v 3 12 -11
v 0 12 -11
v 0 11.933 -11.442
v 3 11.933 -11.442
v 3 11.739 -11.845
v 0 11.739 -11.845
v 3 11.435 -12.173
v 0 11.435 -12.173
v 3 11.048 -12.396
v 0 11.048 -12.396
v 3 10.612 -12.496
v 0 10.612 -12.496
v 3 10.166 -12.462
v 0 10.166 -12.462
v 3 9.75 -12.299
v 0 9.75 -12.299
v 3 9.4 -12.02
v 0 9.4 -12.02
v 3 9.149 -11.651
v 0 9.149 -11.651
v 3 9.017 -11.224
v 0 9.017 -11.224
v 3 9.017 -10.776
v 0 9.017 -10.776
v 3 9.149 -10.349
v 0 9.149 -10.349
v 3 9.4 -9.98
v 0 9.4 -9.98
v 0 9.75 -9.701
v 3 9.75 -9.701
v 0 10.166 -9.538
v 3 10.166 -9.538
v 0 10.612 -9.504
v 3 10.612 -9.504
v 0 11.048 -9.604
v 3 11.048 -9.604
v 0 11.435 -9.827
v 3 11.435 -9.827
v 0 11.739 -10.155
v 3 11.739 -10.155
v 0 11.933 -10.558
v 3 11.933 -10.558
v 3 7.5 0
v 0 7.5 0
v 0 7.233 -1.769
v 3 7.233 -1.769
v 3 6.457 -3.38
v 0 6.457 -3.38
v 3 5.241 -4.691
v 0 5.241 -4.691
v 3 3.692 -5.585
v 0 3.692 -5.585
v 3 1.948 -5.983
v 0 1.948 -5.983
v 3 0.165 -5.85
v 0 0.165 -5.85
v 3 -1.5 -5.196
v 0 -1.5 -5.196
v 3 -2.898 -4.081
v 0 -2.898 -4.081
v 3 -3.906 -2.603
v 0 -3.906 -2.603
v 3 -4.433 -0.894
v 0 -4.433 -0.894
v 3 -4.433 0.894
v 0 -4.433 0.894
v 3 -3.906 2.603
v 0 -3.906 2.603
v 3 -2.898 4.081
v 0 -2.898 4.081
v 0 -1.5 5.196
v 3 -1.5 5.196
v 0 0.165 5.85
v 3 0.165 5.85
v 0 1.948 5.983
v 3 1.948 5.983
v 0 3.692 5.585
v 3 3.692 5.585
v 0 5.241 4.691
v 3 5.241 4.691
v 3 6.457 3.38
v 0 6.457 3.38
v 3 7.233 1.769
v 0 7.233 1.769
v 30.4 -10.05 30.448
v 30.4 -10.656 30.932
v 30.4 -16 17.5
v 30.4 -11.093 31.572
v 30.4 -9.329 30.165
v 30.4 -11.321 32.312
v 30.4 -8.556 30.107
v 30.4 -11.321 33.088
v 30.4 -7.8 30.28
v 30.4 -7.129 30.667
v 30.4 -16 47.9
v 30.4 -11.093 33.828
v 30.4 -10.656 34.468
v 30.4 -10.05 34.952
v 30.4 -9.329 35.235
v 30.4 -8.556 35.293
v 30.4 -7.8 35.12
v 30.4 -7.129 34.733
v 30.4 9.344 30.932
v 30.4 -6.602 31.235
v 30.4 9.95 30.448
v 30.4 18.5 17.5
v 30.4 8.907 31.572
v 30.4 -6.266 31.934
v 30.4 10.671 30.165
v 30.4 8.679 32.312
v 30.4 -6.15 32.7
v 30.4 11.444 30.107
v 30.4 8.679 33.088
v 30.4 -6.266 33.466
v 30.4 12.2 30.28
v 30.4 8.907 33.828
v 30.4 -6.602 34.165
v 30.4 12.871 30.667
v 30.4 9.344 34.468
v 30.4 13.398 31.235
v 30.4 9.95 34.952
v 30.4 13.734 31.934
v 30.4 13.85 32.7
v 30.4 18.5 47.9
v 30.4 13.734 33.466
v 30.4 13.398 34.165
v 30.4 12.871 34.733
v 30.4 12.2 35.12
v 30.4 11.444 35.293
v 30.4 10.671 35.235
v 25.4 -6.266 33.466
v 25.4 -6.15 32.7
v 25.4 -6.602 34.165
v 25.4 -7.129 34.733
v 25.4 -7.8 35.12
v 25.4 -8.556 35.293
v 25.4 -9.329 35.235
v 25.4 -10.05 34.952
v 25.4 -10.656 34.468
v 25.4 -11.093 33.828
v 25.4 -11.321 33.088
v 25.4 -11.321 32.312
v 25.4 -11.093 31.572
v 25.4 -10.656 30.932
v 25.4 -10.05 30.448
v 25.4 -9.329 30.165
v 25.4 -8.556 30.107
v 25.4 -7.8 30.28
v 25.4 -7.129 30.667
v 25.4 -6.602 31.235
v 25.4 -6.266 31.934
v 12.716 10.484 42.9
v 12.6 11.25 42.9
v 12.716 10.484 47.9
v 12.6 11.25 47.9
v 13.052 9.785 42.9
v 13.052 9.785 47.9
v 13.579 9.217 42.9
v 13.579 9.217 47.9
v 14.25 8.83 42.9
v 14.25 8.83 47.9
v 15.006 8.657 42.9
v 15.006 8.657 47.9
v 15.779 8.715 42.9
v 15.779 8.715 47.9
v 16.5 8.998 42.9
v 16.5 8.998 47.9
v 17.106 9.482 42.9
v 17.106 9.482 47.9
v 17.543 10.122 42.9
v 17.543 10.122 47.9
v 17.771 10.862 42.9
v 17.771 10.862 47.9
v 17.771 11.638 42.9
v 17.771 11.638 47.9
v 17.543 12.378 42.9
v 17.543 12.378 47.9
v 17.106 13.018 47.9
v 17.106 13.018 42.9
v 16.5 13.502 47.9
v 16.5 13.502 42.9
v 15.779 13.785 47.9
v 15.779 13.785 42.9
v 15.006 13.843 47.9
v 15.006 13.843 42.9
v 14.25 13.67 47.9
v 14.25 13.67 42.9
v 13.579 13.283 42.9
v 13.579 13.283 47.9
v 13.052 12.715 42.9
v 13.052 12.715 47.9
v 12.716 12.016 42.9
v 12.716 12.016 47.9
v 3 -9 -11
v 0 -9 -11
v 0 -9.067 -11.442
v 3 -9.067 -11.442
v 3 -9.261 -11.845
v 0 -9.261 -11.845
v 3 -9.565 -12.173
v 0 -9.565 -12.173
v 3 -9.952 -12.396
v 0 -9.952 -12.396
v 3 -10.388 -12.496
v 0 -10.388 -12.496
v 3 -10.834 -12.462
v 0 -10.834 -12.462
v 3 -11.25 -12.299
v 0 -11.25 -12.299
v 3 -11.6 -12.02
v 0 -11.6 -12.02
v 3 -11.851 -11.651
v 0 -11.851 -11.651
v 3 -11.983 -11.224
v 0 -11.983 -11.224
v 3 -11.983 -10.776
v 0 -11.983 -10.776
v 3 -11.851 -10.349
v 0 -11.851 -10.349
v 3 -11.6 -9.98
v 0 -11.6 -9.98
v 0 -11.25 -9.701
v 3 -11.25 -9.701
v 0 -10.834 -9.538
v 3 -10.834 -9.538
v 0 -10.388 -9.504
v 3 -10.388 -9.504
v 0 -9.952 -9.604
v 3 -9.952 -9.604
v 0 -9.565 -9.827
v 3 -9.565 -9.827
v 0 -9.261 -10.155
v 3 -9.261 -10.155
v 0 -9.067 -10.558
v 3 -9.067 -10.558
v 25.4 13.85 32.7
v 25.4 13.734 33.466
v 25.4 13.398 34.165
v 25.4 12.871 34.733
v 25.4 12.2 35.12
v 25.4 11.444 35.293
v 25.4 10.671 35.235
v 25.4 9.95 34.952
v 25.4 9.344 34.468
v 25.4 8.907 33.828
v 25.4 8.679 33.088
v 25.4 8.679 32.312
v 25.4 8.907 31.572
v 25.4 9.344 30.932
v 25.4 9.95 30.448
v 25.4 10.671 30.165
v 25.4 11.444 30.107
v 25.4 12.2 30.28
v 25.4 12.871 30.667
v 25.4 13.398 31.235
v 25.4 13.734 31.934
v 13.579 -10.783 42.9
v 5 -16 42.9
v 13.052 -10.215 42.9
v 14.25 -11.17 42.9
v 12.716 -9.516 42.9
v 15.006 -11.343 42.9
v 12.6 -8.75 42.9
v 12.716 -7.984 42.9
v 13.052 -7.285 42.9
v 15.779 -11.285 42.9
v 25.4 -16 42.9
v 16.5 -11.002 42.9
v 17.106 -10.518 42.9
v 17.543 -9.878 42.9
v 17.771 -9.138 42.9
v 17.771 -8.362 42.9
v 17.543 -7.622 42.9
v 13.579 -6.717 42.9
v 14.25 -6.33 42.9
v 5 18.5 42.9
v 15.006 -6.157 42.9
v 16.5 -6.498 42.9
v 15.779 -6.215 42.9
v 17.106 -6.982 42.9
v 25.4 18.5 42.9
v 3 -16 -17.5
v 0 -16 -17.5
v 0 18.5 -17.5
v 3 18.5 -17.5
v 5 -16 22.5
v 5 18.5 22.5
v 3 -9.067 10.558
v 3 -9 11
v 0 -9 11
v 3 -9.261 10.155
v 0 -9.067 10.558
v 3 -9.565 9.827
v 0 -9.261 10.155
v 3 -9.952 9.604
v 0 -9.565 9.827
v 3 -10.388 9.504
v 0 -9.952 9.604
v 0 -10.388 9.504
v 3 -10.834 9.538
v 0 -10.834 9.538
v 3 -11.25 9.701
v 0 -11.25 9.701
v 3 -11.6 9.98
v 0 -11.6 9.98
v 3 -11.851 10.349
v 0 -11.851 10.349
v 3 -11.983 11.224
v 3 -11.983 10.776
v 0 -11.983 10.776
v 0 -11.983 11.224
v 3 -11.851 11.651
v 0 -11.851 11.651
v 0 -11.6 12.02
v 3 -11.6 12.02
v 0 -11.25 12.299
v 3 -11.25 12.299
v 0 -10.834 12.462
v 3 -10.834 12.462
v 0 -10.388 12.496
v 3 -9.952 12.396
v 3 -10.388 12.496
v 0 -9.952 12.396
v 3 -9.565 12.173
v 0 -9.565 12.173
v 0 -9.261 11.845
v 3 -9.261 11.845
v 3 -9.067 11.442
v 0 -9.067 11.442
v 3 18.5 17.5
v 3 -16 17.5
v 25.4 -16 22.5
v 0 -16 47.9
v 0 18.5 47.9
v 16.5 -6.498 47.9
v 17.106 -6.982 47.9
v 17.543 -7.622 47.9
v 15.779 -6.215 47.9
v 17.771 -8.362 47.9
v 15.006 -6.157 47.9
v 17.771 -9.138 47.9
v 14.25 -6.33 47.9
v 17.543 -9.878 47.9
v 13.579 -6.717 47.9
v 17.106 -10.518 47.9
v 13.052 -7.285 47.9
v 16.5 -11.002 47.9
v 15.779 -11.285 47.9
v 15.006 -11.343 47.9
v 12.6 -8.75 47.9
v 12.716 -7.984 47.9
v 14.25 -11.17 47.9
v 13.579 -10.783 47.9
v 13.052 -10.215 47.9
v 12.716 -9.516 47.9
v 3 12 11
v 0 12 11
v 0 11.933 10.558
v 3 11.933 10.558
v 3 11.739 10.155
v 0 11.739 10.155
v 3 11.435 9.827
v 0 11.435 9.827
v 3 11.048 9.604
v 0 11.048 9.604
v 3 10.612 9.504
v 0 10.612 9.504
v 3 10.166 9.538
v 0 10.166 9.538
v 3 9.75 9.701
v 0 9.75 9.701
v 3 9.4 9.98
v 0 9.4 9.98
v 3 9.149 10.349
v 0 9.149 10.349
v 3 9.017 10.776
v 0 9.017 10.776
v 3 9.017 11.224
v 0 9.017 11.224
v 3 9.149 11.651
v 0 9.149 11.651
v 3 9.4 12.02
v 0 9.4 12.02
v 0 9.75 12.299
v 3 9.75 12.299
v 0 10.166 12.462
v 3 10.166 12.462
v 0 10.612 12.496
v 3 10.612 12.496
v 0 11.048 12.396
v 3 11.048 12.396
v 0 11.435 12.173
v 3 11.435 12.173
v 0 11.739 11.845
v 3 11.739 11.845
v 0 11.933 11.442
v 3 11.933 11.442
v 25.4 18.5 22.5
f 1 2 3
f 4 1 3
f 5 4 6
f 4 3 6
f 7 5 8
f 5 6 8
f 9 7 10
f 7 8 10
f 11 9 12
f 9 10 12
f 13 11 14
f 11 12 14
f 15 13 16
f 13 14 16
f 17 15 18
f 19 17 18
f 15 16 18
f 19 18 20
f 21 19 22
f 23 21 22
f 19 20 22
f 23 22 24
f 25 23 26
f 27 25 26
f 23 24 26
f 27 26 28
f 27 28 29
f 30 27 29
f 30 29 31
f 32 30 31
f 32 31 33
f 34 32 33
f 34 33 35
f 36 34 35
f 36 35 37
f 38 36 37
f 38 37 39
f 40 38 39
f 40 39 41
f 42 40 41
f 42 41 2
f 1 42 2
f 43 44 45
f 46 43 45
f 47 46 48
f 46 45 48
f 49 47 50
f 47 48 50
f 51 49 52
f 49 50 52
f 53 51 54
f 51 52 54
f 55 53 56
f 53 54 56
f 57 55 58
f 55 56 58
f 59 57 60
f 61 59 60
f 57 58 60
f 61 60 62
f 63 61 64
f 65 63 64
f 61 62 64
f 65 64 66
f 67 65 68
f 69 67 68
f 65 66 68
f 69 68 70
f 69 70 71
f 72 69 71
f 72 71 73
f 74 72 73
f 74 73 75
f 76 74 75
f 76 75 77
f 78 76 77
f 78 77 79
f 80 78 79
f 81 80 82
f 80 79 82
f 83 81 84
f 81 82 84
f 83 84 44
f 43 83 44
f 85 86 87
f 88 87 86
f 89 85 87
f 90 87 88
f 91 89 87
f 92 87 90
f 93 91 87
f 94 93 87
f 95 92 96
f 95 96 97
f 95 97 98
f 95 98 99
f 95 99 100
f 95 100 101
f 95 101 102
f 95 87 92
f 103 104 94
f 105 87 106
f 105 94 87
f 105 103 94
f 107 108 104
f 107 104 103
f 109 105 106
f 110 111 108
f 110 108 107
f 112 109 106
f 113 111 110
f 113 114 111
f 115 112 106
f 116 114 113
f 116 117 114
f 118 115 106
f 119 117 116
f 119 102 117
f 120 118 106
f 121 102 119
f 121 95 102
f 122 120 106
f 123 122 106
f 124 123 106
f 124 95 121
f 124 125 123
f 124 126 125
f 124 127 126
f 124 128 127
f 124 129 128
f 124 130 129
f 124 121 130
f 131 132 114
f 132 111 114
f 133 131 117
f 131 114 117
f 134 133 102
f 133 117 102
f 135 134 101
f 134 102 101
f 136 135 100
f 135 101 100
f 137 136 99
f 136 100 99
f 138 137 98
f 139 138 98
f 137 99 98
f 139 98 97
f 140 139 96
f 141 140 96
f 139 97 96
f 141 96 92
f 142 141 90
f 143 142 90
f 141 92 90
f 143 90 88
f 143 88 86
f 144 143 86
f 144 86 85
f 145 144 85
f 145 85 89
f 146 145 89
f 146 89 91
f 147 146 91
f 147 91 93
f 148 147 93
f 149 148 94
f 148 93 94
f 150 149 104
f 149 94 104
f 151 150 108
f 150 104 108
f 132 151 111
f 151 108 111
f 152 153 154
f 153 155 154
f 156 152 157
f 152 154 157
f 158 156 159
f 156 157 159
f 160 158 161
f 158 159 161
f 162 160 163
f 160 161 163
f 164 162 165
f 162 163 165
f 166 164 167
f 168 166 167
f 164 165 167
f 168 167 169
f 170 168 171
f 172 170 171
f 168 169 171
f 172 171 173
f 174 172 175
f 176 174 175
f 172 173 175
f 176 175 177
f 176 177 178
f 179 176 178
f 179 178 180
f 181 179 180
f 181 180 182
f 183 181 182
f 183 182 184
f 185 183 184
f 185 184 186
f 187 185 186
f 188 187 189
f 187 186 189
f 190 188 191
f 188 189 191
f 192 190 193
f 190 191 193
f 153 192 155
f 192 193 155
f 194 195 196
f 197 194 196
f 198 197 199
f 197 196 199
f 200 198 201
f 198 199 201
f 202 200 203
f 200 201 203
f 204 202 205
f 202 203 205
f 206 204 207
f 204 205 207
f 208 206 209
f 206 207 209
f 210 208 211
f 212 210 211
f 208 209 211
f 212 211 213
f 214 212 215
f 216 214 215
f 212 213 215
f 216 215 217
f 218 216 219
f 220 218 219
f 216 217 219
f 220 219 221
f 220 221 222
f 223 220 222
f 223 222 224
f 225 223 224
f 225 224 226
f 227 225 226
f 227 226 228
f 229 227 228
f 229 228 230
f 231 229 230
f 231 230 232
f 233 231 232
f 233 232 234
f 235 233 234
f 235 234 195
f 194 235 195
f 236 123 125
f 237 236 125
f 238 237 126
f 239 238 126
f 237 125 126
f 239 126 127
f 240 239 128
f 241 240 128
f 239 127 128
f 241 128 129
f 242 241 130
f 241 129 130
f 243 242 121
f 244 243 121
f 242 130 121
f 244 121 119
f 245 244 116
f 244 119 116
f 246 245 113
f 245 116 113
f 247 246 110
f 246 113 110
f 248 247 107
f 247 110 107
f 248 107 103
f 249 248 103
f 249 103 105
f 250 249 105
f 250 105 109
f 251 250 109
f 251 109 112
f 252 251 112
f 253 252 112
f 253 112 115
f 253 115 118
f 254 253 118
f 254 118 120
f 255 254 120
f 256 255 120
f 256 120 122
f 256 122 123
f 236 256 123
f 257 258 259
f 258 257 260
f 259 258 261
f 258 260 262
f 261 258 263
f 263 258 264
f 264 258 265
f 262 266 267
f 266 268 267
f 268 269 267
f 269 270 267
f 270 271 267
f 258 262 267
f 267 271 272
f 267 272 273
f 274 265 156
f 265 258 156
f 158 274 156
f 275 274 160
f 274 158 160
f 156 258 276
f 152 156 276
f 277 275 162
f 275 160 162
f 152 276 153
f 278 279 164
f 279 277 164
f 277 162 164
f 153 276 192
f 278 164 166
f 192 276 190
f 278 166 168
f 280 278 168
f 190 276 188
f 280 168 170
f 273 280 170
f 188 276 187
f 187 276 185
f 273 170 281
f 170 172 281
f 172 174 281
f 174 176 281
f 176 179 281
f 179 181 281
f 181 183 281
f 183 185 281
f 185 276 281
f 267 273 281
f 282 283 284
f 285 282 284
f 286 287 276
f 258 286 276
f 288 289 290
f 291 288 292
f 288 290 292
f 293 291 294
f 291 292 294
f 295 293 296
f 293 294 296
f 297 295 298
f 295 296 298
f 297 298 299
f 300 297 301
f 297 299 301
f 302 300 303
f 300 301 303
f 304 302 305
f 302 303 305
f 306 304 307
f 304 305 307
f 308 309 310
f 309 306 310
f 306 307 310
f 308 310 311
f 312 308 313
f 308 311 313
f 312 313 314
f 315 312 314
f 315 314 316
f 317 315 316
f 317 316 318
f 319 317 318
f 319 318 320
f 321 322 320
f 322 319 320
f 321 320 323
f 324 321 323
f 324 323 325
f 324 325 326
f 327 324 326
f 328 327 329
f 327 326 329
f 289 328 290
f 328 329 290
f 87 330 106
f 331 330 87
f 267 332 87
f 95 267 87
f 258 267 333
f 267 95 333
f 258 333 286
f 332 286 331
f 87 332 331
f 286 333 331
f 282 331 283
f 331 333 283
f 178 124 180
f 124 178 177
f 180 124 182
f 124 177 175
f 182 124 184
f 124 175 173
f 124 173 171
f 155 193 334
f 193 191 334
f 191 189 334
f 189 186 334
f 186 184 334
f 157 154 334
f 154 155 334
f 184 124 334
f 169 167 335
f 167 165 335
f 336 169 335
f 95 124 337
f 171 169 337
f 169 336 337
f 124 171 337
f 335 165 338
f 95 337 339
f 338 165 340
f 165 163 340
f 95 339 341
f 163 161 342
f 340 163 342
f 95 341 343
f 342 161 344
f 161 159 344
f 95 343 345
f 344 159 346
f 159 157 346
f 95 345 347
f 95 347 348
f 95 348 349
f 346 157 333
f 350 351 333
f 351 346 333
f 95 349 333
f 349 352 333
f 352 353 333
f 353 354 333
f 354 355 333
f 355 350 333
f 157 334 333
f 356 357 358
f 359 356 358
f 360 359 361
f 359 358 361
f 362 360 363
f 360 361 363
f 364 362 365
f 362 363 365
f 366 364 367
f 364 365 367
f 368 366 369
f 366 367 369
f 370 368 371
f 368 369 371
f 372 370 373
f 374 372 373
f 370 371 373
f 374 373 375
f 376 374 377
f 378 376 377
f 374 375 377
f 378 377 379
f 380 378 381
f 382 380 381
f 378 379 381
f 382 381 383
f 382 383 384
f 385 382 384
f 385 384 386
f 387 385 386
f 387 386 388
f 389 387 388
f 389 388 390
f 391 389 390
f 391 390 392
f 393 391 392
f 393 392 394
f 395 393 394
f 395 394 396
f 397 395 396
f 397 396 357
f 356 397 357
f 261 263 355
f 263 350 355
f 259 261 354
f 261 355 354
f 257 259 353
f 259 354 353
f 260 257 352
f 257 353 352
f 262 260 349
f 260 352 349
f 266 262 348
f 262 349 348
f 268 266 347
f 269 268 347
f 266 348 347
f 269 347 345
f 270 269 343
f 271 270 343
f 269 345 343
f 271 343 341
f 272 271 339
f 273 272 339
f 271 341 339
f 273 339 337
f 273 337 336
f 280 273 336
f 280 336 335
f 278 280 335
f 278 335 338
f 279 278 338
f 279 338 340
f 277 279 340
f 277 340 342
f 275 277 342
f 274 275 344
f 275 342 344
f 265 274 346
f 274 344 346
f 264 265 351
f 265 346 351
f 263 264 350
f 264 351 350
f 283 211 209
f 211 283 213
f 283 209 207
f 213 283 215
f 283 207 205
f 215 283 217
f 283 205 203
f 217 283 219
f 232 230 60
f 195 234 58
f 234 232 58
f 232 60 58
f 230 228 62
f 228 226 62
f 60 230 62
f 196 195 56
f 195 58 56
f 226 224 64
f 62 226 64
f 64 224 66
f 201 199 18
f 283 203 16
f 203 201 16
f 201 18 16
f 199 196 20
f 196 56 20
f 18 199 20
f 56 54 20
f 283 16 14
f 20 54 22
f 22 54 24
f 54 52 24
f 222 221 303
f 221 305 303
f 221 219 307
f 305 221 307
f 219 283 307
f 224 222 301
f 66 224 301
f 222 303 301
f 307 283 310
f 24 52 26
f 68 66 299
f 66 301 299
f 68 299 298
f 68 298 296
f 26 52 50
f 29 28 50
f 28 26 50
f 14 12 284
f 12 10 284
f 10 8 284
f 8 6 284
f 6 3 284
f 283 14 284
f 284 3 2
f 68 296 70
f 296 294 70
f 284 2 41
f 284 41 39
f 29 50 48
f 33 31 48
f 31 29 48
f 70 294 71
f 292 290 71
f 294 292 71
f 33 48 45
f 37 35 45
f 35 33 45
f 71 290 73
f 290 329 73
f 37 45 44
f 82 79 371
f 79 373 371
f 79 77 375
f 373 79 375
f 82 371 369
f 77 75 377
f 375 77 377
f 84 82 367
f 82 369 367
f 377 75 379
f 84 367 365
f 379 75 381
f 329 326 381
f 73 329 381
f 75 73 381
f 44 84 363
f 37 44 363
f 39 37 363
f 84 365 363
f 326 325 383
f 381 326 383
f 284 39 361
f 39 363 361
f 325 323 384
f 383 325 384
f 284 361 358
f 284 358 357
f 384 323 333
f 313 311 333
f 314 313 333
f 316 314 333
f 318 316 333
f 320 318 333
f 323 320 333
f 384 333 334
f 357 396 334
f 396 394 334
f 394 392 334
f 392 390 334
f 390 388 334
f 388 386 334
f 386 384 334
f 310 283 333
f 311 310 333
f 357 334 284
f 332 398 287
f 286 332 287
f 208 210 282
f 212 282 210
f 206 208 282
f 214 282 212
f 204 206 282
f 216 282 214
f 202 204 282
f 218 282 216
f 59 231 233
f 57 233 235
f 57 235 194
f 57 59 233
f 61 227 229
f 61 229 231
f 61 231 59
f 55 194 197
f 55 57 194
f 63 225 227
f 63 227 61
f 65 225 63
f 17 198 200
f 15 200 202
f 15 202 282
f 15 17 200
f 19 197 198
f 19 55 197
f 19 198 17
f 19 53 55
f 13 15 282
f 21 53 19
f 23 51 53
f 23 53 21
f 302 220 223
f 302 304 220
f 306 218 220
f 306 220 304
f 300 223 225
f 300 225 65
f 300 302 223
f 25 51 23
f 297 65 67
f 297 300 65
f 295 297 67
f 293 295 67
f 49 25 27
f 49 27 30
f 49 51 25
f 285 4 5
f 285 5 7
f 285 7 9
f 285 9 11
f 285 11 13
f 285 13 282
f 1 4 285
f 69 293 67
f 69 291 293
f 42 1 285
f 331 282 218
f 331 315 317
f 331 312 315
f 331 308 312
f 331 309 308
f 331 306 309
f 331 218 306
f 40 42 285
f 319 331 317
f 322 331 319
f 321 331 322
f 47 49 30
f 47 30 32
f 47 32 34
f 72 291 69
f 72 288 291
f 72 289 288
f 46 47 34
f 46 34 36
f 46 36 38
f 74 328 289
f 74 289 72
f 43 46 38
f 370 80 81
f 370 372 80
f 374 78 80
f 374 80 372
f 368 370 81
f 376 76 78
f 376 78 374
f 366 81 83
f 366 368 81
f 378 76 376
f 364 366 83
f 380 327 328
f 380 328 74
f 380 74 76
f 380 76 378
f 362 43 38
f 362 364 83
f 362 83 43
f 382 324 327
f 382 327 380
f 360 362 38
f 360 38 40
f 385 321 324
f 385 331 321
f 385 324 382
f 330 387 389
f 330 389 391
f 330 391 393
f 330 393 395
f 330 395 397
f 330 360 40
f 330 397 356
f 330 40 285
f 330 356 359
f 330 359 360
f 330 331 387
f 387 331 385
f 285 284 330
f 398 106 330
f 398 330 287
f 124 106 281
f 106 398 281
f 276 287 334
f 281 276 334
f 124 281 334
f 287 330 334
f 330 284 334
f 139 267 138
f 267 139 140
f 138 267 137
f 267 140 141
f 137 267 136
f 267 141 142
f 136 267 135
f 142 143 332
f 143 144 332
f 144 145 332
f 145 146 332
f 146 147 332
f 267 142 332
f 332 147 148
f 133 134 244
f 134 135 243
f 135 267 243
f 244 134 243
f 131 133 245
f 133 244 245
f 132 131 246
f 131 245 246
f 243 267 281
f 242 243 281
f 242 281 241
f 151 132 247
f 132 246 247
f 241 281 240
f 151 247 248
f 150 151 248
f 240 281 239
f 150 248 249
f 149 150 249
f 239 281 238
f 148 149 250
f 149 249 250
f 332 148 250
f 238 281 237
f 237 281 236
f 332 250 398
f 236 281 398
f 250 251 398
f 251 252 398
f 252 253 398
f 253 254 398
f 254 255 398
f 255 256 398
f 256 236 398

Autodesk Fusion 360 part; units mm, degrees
sketch "스케치1" plane through (0, 0, 0) normal (1, 0, 0) x (0, 1, 0)
  line L0 (10.5, 11) -> (-10.5, 11)
  line L1 (-10.5, 11) -> (-10.5, -11)
  line L2 (-10.5, -11) -> (10.5, -11)
  line L3 (10.5, -11) -> (10.5, 11)
  line L4 (10.5, 11) -> (-10.5, -11) construction
  line L5 (-10.5, 11) -> (10.5, -11) construction
  circle A0 centre (10.5, 11) radius 1.5
  circle A1 centre (-10.5, 11) radius 1.5
  circle A2 centre (10.5, -11) radius 1.5
  circle A3 centre (-10.5, -11) radius 1.5
  line L6 (10.5, 0) -> (1.5, 0)
  circle A4 centre (1.5, 0) radius 6
  line L7 (10.5, 0) -> (18.5, 0)
  line L8 (1.5, 0) -> (-16, 0)
  line L9 (18.5, 0) -> (18.5, 17.5)
  line L10 (-16, 0) -> (-16, -17.5)
  line L11 (-16, -17.5) -> (18.5, -17.5)
  line L12 (18.5, -17.5) -> (18.5, 17.5)
  line L13 (18.5, 17.5) -> (-16, 17.5)
  line L14 (-16, 17.5) -> (-16, -17.5)
  line L15 (-16, 17.5) -> (18.5, 17.5)
  line L16 (18.5, 17.5) -> (18.5, 47.9)
  line L17 (18.5, 47.9) -> (-16, 47.9)
  line L18 (-16, 47.9) -> (-16, 17.5)
  dimension "d1" = 21
  dimension "d2" = 22
  dimension "d3" = 3
  dimension "d4" = 3
  dimension "d5" = 3
  dimension "d6" = 3
  dimension "d8" = 9
  dimension "d9" = 12
  dimension "d10" = 8
  dimension "d11" = 17.5
  dimension "d12" = 17.5
  dimension "d13" = 17.5
  dimension "d16" = 30.4
extrude "돌출1" add sketch "스케치1" along normal blind 3 contours L0 L1 L3 A0 A1 L7 L8 L9 L12 L13 L14 L15 | L0 L1 L3 A0 A1 L6 A4 L8 | L1 L2 L3 A2 A3 L6 A4 L8 | L1 L2 L3 A2 A3 L7 L8 L10 L11 L12 L14 | L13 L15 L16 L17 L18
extrude "돌출2" add sketch "스케치1" along normal blind 30.4 contours L13 L15 L16 L17 L18
sketch "스케치5" plane through (0, 18.5, 0) normal (0, 1, 0) x (-1, 0, 0)
  line L0 (-3, 17.5) -> (-3, -17.5)
  line L1 (-3, -17.5) -> (0, -17.5)
  line L2 (0, -17.5) -> (0, 47.9)
  line L3 (0, 47.9) -> (-30.4, 47.9)
  line L4 (-30.4, 47.9) -> (-30.4, 17.5)
  line L5 (-30.4, 17.5) -> (-3, 17.5)
  line L6 (-30.4, 47.9) -> (0, 47.9)
  line L7 (0, 47.9) -> (0, 17.5)
  line L8 (0, 17.5) -> (-30.4, 17.5)
  line L9 (-30.4, 17.5) -> (-30.4, 47.9)
  line L10 (-5, 42.9) -> (-25.4, 42.9)
  line L11 (-25.4, 42.9) -> (-25.4, 22.5)
  line L12 (-25.4, 22.5) -> (-5, 22.5)
  line L13 (-5, 22.5) -> (-5, 42.9)
  line L14 (-5, 42.9) -> (-25.4, 22.5) construction
  line L15 (-25.4, 42.9) -> (-5, 22.5) construction
  point P0 (-15.2, 32.7)
  dimension "d37" = 20.4
  dimension "d38" = 20.4
extrude "돌출7" cut sketch "스케치5" against normal blind 100 contours L10 L11 L12 L13
sketch "스케치6" plane through (0, 0, 47.9) normal (0, 0, 1) x (-1, 0, 0)
  line L0 (0, -18.5) -> (0, 16)
  line L1 (0, 16) -> (-30.4, 16)
  line L2 (-30.4, 16) -> (-30.4, -18.5)
  line L3 (-30.4, -18.5) -> (0, -18.5)
  line L4 (-15.2, 16) -> (-15.2, 8.75)
  circle A0 centre (-15.2, 8.75) radius 2.6
  line L5 (-15.2, -18.5) -> (-15.2, -11.25)
  circle A1 centre (-15.2, -11.25) radius 2.6
  dimension "d41" = 7.25
  dimension "d42" = 5.2
  dimension "d43" = 7.25
  dimension "d44" = 5.2
extrude "돌출8" cut sketch "스케치6" against normal blind 5 contours A0 | A1
sketch "스케치7" plane through (30.4, 0, 0) normal (1, 0, 0) x (0, 1, 0)
  line L0 (-16, 47.9) -> (-16, 17.5)
  line L1 (-16, 17.5) -> (18.5, 17.5)
  line L2 (18.5, 17.5) -> (18.5, 47.9)
  line L3 (18.5, 47.9) -> (-16, 47.9)
  line L4 (-16, 32.7) -> (-8.75, 32.7)
  circle A0 centre (-8.75, 32.7) radius 2.6
  line L5 (18.5, 32.7) -> (11.25, 32.7)
  circle A1 centre (11.25, 32.7) radius 2.6
  dimension "d47" = 7.25
  dimension "d48" = 5.2
  dimension "d49" = 7.25
  dimension "d50" = 5.2
extrude "돌출9" cut sketch "스케치7" against normal blind 5 contours A0 | A1
extrude "돌출6" [suppressed]
